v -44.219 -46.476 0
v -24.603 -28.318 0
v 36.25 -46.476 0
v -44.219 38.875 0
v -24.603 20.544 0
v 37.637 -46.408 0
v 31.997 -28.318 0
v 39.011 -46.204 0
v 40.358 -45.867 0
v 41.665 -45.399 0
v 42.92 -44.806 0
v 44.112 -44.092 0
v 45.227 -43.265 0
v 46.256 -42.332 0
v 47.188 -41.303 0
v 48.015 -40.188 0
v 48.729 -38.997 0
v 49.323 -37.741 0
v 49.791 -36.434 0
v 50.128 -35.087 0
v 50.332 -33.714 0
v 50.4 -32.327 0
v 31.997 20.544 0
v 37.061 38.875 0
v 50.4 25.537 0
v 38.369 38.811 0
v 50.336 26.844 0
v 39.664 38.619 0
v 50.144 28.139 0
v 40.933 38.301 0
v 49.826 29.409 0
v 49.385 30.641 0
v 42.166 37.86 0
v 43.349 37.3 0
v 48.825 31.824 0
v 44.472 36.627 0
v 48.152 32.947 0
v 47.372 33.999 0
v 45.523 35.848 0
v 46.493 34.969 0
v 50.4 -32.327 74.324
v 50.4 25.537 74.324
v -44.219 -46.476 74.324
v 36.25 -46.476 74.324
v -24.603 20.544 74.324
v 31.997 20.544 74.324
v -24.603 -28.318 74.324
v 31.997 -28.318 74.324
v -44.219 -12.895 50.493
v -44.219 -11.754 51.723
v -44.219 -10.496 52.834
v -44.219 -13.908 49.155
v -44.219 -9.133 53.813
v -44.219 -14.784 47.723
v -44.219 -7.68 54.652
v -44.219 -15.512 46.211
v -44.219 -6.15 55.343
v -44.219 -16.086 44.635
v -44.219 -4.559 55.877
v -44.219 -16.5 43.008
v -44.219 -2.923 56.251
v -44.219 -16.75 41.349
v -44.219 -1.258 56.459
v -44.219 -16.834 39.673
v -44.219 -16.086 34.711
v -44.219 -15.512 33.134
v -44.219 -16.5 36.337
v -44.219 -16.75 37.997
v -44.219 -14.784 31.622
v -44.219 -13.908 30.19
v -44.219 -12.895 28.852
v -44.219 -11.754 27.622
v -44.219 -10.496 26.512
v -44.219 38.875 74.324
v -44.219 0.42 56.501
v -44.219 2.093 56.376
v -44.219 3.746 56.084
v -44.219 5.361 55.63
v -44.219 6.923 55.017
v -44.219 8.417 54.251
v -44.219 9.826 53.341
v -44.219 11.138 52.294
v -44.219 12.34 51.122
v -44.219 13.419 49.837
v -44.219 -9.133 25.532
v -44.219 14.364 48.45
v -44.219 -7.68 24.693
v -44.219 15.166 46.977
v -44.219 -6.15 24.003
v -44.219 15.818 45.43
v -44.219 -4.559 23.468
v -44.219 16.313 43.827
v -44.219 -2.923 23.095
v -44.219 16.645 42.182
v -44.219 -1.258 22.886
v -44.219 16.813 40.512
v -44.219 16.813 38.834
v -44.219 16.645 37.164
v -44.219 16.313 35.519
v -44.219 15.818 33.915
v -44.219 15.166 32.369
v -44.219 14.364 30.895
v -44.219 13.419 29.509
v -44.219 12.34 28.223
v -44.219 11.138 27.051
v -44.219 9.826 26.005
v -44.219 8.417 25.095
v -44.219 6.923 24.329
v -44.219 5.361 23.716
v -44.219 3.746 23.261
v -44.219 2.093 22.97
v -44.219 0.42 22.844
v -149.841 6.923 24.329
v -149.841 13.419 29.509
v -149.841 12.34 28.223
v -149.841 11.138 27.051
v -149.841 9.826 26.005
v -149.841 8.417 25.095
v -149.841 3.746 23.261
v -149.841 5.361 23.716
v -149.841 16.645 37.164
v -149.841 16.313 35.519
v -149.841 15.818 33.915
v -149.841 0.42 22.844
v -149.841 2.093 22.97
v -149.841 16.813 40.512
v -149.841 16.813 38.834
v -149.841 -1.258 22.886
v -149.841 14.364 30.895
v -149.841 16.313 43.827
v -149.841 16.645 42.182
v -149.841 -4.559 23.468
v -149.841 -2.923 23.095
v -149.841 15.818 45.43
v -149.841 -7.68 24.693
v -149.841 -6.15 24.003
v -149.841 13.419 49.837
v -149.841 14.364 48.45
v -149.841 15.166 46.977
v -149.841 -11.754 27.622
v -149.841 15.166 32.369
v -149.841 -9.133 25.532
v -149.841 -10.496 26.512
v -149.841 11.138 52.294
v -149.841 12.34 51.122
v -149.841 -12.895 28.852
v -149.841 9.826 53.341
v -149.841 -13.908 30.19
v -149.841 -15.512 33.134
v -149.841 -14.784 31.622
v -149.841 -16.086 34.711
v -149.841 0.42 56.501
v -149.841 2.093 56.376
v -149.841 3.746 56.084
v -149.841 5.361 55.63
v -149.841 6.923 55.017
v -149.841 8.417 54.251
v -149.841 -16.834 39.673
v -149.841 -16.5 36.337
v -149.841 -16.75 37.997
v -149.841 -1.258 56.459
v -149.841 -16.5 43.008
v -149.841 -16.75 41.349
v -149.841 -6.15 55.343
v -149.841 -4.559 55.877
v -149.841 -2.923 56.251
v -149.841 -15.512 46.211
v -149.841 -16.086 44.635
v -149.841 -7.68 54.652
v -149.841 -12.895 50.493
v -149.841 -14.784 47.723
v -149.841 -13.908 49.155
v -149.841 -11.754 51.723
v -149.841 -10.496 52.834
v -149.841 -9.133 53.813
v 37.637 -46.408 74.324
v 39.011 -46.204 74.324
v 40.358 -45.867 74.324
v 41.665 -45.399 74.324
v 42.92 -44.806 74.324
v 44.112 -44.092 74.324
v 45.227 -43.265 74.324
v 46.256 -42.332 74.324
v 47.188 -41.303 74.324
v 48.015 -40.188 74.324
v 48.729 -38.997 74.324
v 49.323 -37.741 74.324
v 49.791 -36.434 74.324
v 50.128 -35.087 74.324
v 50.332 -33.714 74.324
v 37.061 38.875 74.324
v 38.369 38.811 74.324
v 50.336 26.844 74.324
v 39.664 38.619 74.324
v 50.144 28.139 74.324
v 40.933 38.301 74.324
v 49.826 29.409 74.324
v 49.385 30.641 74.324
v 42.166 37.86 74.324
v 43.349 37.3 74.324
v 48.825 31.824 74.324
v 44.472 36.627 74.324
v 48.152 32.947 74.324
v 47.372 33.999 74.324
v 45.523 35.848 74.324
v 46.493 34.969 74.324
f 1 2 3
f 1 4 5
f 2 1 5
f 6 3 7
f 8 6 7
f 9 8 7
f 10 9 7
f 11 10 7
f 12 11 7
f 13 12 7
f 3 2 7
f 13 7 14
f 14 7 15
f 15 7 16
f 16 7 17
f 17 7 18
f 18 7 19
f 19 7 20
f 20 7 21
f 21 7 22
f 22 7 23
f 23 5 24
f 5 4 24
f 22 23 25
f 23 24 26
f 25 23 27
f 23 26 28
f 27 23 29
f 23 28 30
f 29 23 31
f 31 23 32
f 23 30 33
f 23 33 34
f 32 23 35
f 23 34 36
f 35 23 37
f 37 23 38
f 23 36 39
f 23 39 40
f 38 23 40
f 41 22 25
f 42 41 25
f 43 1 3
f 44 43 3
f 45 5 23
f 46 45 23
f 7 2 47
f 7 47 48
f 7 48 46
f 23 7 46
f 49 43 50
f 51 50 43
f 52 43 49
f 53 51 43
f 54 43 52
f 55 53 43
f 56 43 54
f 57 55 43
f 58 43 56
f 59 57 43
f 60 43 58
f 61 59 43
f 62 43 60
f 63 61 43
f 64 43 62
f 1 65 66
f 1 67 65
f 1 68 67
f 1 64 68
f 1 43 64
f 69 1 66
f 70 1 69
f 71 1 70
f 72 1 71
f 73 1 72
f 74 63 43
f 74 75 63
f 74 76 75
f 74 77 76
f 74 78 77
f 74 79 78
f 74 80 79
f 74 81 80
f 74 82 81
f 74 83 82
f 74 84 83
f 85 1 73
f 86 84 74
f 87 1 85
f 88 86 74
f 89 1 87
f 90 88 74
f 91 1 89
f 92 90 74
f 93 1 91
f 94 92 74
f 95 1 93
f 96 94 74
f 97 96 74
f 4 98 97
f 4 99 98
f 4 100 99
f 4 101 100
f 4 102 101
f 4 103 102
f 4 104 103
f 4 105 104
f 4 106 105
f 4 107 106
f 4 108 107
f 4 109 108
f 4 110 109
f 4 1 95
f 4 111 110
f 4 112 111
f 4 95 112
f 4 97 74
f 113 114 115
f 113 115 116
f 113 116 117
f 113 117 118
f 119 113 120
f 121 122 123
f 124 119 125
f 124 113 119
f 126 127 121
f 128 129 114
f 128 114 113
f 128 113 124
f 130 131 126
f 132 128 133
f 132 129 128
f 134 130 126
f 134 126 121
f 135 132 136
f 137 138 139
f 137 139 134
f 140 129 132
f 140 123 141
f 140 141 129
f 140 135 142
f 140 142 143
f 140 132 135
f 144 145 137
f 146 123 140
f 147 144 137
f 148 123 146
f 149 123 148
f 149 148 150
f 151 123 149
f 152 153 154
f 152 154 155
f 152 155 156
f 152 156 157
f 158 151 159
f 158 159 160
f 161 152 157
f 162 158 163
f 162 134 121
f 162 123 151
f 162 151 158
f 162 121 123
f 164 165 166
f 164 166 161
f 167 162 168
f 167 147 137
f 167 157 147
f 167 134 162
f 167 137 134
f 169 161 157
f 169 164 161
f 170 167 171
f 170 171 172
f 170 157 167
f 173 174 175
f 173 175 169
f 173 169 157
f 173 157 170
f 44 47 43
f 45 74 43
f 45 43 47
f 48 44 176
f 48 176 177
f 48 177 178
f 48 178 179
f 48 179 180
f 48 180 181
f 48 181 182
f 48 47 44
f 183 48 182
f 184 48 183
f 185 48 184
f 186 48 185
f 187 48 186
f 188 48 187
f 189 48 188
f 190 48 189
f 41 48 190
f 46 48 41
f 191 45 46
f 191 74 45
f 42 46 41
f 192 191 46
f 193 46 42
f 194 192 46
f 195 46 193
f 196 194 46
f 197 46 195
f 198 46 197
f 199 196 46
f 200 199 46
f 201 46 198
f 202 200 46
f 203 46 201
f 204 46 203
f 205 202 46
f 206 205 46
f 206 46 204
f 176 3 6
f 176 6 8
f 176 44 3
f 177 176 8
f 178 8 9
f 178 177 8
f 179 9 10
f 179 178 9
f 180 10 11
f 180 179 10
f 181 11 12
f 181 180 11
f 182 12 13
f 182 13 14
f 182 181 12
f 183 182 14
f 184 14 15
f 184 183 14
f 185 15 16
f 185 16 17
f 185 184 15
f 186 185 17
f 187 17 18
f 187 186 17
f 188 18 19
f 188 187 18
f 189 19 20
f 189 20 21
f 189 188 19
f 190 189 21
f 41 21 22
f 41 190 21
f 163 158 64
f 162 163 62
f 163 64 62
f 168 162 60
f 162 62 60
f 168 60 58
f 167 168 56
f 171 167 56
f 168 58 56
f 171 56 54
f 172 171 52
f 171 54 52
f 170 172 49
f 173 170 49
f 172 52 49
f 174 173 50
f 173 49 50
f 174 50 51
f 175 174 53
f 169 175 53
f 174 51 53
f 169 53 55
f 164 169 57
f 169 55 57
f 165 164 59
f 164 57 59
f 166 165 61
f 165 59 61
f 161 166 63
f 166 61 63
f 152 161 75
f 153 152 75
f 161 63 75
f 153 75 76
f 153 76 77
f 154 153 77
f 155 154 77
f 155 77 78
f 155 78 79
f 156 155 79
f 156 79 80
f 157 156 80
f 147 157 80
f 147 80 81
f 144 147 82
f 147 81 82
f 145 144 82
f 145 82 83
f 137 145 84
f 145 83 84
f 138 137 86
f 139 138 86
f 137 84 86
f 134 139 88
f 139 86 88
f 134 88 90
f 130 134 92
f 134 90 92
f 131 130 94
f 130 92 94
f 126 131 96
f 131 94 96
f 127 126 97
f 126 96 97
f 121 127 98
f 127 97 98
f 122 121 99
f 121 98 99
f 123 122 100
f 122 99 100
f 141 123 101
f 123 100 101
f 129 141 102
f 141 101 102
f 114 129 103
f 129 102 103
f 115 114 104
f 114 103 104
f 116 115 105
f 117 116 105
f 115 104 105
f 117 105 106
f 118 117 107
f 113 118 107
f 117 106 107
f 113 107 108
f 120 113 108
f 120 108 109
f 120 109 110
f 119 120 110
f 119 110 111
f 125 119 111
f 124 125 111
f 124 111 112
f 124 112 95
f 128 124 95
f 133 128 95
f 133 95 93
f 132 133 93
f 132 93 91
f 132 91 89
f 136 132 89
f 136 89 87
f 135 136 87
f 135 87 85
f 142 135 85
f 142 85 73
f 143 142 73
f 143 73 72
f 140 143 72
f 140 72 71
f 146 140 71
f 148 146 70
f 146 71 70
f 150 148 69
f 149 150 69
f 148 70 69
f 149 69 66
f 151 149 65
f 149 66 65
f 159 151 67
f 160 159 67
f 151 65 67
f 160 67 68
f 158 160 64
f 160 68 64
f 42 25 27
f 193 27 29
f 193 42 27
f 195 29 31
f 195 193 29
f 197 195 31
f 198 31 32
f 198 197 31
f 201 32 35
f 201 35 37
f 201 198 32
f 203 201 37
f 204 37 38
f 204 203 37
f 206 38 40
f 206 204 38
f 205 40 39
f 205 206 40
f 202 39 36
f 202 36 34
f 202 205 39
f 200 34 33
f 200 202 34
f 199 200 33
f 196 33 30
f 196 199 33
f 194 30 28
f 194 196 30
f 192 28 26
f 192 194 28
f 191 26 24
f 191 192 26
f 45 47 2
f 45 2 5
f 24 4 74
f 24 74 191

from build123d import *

# Parameters (mm, degrees)
F0_W     = 94.618846
F0_H     = 85.351713
F1_DEPTH = 74.324219
F2_W     = 56.600913
F2_H     = 48.861958
F3_DEPTH = 132.836582
F4_R     = 16.833505
F5_DEPTH = 105.622353
F6_R     = 14.149732
F7_R     = 13.33873


with BuildPart() as f1:
    # F0 (on Top) → F1 (new body)
    with BuildSketch(Plane.XY):
        with Locations((3.090644, -3.800507)):
            Rectangle(F0_W, F0_H)
    extrude(amount=F1_DEPTH)

    # F2 (on face) → F3 (cut)
    with BuildSketch(Plane.XY.offset(74.324219)):
        with Locations((3.696986, -3.887054)):
            Rectangle(F2_W, F2_H)
    extrude(amount=-F3_DEPTH, mode=Mode.SUBTRACT)

    # F4 (on face) → F5 (join)
    with BuildSketch(Plane(origin=(-44.218779, 0, 0), x_dir=(0, -1, 0), z_dir=(-1, 0, 0))):
        with Locations((0, 39.672762)):
            Circle(F4_R)
    extrude(amount=F5_DEPTH)

    # F6
    f6_edges = [f1.edges().sort_by_distance(p)[0] for p in [
        (50.400067, -46.476364, 37.162109),
    ]]
    fillet(f6_edges, radius=F6_R)

    # F7
    f7_edges = [f1.edges().sort_by_distance(p)[0] for p in [
        (50.400067, 38.875349, 37.162109),
    ]]
    fillet(f7_edges, radius=F7_R)


solid = f1.part
